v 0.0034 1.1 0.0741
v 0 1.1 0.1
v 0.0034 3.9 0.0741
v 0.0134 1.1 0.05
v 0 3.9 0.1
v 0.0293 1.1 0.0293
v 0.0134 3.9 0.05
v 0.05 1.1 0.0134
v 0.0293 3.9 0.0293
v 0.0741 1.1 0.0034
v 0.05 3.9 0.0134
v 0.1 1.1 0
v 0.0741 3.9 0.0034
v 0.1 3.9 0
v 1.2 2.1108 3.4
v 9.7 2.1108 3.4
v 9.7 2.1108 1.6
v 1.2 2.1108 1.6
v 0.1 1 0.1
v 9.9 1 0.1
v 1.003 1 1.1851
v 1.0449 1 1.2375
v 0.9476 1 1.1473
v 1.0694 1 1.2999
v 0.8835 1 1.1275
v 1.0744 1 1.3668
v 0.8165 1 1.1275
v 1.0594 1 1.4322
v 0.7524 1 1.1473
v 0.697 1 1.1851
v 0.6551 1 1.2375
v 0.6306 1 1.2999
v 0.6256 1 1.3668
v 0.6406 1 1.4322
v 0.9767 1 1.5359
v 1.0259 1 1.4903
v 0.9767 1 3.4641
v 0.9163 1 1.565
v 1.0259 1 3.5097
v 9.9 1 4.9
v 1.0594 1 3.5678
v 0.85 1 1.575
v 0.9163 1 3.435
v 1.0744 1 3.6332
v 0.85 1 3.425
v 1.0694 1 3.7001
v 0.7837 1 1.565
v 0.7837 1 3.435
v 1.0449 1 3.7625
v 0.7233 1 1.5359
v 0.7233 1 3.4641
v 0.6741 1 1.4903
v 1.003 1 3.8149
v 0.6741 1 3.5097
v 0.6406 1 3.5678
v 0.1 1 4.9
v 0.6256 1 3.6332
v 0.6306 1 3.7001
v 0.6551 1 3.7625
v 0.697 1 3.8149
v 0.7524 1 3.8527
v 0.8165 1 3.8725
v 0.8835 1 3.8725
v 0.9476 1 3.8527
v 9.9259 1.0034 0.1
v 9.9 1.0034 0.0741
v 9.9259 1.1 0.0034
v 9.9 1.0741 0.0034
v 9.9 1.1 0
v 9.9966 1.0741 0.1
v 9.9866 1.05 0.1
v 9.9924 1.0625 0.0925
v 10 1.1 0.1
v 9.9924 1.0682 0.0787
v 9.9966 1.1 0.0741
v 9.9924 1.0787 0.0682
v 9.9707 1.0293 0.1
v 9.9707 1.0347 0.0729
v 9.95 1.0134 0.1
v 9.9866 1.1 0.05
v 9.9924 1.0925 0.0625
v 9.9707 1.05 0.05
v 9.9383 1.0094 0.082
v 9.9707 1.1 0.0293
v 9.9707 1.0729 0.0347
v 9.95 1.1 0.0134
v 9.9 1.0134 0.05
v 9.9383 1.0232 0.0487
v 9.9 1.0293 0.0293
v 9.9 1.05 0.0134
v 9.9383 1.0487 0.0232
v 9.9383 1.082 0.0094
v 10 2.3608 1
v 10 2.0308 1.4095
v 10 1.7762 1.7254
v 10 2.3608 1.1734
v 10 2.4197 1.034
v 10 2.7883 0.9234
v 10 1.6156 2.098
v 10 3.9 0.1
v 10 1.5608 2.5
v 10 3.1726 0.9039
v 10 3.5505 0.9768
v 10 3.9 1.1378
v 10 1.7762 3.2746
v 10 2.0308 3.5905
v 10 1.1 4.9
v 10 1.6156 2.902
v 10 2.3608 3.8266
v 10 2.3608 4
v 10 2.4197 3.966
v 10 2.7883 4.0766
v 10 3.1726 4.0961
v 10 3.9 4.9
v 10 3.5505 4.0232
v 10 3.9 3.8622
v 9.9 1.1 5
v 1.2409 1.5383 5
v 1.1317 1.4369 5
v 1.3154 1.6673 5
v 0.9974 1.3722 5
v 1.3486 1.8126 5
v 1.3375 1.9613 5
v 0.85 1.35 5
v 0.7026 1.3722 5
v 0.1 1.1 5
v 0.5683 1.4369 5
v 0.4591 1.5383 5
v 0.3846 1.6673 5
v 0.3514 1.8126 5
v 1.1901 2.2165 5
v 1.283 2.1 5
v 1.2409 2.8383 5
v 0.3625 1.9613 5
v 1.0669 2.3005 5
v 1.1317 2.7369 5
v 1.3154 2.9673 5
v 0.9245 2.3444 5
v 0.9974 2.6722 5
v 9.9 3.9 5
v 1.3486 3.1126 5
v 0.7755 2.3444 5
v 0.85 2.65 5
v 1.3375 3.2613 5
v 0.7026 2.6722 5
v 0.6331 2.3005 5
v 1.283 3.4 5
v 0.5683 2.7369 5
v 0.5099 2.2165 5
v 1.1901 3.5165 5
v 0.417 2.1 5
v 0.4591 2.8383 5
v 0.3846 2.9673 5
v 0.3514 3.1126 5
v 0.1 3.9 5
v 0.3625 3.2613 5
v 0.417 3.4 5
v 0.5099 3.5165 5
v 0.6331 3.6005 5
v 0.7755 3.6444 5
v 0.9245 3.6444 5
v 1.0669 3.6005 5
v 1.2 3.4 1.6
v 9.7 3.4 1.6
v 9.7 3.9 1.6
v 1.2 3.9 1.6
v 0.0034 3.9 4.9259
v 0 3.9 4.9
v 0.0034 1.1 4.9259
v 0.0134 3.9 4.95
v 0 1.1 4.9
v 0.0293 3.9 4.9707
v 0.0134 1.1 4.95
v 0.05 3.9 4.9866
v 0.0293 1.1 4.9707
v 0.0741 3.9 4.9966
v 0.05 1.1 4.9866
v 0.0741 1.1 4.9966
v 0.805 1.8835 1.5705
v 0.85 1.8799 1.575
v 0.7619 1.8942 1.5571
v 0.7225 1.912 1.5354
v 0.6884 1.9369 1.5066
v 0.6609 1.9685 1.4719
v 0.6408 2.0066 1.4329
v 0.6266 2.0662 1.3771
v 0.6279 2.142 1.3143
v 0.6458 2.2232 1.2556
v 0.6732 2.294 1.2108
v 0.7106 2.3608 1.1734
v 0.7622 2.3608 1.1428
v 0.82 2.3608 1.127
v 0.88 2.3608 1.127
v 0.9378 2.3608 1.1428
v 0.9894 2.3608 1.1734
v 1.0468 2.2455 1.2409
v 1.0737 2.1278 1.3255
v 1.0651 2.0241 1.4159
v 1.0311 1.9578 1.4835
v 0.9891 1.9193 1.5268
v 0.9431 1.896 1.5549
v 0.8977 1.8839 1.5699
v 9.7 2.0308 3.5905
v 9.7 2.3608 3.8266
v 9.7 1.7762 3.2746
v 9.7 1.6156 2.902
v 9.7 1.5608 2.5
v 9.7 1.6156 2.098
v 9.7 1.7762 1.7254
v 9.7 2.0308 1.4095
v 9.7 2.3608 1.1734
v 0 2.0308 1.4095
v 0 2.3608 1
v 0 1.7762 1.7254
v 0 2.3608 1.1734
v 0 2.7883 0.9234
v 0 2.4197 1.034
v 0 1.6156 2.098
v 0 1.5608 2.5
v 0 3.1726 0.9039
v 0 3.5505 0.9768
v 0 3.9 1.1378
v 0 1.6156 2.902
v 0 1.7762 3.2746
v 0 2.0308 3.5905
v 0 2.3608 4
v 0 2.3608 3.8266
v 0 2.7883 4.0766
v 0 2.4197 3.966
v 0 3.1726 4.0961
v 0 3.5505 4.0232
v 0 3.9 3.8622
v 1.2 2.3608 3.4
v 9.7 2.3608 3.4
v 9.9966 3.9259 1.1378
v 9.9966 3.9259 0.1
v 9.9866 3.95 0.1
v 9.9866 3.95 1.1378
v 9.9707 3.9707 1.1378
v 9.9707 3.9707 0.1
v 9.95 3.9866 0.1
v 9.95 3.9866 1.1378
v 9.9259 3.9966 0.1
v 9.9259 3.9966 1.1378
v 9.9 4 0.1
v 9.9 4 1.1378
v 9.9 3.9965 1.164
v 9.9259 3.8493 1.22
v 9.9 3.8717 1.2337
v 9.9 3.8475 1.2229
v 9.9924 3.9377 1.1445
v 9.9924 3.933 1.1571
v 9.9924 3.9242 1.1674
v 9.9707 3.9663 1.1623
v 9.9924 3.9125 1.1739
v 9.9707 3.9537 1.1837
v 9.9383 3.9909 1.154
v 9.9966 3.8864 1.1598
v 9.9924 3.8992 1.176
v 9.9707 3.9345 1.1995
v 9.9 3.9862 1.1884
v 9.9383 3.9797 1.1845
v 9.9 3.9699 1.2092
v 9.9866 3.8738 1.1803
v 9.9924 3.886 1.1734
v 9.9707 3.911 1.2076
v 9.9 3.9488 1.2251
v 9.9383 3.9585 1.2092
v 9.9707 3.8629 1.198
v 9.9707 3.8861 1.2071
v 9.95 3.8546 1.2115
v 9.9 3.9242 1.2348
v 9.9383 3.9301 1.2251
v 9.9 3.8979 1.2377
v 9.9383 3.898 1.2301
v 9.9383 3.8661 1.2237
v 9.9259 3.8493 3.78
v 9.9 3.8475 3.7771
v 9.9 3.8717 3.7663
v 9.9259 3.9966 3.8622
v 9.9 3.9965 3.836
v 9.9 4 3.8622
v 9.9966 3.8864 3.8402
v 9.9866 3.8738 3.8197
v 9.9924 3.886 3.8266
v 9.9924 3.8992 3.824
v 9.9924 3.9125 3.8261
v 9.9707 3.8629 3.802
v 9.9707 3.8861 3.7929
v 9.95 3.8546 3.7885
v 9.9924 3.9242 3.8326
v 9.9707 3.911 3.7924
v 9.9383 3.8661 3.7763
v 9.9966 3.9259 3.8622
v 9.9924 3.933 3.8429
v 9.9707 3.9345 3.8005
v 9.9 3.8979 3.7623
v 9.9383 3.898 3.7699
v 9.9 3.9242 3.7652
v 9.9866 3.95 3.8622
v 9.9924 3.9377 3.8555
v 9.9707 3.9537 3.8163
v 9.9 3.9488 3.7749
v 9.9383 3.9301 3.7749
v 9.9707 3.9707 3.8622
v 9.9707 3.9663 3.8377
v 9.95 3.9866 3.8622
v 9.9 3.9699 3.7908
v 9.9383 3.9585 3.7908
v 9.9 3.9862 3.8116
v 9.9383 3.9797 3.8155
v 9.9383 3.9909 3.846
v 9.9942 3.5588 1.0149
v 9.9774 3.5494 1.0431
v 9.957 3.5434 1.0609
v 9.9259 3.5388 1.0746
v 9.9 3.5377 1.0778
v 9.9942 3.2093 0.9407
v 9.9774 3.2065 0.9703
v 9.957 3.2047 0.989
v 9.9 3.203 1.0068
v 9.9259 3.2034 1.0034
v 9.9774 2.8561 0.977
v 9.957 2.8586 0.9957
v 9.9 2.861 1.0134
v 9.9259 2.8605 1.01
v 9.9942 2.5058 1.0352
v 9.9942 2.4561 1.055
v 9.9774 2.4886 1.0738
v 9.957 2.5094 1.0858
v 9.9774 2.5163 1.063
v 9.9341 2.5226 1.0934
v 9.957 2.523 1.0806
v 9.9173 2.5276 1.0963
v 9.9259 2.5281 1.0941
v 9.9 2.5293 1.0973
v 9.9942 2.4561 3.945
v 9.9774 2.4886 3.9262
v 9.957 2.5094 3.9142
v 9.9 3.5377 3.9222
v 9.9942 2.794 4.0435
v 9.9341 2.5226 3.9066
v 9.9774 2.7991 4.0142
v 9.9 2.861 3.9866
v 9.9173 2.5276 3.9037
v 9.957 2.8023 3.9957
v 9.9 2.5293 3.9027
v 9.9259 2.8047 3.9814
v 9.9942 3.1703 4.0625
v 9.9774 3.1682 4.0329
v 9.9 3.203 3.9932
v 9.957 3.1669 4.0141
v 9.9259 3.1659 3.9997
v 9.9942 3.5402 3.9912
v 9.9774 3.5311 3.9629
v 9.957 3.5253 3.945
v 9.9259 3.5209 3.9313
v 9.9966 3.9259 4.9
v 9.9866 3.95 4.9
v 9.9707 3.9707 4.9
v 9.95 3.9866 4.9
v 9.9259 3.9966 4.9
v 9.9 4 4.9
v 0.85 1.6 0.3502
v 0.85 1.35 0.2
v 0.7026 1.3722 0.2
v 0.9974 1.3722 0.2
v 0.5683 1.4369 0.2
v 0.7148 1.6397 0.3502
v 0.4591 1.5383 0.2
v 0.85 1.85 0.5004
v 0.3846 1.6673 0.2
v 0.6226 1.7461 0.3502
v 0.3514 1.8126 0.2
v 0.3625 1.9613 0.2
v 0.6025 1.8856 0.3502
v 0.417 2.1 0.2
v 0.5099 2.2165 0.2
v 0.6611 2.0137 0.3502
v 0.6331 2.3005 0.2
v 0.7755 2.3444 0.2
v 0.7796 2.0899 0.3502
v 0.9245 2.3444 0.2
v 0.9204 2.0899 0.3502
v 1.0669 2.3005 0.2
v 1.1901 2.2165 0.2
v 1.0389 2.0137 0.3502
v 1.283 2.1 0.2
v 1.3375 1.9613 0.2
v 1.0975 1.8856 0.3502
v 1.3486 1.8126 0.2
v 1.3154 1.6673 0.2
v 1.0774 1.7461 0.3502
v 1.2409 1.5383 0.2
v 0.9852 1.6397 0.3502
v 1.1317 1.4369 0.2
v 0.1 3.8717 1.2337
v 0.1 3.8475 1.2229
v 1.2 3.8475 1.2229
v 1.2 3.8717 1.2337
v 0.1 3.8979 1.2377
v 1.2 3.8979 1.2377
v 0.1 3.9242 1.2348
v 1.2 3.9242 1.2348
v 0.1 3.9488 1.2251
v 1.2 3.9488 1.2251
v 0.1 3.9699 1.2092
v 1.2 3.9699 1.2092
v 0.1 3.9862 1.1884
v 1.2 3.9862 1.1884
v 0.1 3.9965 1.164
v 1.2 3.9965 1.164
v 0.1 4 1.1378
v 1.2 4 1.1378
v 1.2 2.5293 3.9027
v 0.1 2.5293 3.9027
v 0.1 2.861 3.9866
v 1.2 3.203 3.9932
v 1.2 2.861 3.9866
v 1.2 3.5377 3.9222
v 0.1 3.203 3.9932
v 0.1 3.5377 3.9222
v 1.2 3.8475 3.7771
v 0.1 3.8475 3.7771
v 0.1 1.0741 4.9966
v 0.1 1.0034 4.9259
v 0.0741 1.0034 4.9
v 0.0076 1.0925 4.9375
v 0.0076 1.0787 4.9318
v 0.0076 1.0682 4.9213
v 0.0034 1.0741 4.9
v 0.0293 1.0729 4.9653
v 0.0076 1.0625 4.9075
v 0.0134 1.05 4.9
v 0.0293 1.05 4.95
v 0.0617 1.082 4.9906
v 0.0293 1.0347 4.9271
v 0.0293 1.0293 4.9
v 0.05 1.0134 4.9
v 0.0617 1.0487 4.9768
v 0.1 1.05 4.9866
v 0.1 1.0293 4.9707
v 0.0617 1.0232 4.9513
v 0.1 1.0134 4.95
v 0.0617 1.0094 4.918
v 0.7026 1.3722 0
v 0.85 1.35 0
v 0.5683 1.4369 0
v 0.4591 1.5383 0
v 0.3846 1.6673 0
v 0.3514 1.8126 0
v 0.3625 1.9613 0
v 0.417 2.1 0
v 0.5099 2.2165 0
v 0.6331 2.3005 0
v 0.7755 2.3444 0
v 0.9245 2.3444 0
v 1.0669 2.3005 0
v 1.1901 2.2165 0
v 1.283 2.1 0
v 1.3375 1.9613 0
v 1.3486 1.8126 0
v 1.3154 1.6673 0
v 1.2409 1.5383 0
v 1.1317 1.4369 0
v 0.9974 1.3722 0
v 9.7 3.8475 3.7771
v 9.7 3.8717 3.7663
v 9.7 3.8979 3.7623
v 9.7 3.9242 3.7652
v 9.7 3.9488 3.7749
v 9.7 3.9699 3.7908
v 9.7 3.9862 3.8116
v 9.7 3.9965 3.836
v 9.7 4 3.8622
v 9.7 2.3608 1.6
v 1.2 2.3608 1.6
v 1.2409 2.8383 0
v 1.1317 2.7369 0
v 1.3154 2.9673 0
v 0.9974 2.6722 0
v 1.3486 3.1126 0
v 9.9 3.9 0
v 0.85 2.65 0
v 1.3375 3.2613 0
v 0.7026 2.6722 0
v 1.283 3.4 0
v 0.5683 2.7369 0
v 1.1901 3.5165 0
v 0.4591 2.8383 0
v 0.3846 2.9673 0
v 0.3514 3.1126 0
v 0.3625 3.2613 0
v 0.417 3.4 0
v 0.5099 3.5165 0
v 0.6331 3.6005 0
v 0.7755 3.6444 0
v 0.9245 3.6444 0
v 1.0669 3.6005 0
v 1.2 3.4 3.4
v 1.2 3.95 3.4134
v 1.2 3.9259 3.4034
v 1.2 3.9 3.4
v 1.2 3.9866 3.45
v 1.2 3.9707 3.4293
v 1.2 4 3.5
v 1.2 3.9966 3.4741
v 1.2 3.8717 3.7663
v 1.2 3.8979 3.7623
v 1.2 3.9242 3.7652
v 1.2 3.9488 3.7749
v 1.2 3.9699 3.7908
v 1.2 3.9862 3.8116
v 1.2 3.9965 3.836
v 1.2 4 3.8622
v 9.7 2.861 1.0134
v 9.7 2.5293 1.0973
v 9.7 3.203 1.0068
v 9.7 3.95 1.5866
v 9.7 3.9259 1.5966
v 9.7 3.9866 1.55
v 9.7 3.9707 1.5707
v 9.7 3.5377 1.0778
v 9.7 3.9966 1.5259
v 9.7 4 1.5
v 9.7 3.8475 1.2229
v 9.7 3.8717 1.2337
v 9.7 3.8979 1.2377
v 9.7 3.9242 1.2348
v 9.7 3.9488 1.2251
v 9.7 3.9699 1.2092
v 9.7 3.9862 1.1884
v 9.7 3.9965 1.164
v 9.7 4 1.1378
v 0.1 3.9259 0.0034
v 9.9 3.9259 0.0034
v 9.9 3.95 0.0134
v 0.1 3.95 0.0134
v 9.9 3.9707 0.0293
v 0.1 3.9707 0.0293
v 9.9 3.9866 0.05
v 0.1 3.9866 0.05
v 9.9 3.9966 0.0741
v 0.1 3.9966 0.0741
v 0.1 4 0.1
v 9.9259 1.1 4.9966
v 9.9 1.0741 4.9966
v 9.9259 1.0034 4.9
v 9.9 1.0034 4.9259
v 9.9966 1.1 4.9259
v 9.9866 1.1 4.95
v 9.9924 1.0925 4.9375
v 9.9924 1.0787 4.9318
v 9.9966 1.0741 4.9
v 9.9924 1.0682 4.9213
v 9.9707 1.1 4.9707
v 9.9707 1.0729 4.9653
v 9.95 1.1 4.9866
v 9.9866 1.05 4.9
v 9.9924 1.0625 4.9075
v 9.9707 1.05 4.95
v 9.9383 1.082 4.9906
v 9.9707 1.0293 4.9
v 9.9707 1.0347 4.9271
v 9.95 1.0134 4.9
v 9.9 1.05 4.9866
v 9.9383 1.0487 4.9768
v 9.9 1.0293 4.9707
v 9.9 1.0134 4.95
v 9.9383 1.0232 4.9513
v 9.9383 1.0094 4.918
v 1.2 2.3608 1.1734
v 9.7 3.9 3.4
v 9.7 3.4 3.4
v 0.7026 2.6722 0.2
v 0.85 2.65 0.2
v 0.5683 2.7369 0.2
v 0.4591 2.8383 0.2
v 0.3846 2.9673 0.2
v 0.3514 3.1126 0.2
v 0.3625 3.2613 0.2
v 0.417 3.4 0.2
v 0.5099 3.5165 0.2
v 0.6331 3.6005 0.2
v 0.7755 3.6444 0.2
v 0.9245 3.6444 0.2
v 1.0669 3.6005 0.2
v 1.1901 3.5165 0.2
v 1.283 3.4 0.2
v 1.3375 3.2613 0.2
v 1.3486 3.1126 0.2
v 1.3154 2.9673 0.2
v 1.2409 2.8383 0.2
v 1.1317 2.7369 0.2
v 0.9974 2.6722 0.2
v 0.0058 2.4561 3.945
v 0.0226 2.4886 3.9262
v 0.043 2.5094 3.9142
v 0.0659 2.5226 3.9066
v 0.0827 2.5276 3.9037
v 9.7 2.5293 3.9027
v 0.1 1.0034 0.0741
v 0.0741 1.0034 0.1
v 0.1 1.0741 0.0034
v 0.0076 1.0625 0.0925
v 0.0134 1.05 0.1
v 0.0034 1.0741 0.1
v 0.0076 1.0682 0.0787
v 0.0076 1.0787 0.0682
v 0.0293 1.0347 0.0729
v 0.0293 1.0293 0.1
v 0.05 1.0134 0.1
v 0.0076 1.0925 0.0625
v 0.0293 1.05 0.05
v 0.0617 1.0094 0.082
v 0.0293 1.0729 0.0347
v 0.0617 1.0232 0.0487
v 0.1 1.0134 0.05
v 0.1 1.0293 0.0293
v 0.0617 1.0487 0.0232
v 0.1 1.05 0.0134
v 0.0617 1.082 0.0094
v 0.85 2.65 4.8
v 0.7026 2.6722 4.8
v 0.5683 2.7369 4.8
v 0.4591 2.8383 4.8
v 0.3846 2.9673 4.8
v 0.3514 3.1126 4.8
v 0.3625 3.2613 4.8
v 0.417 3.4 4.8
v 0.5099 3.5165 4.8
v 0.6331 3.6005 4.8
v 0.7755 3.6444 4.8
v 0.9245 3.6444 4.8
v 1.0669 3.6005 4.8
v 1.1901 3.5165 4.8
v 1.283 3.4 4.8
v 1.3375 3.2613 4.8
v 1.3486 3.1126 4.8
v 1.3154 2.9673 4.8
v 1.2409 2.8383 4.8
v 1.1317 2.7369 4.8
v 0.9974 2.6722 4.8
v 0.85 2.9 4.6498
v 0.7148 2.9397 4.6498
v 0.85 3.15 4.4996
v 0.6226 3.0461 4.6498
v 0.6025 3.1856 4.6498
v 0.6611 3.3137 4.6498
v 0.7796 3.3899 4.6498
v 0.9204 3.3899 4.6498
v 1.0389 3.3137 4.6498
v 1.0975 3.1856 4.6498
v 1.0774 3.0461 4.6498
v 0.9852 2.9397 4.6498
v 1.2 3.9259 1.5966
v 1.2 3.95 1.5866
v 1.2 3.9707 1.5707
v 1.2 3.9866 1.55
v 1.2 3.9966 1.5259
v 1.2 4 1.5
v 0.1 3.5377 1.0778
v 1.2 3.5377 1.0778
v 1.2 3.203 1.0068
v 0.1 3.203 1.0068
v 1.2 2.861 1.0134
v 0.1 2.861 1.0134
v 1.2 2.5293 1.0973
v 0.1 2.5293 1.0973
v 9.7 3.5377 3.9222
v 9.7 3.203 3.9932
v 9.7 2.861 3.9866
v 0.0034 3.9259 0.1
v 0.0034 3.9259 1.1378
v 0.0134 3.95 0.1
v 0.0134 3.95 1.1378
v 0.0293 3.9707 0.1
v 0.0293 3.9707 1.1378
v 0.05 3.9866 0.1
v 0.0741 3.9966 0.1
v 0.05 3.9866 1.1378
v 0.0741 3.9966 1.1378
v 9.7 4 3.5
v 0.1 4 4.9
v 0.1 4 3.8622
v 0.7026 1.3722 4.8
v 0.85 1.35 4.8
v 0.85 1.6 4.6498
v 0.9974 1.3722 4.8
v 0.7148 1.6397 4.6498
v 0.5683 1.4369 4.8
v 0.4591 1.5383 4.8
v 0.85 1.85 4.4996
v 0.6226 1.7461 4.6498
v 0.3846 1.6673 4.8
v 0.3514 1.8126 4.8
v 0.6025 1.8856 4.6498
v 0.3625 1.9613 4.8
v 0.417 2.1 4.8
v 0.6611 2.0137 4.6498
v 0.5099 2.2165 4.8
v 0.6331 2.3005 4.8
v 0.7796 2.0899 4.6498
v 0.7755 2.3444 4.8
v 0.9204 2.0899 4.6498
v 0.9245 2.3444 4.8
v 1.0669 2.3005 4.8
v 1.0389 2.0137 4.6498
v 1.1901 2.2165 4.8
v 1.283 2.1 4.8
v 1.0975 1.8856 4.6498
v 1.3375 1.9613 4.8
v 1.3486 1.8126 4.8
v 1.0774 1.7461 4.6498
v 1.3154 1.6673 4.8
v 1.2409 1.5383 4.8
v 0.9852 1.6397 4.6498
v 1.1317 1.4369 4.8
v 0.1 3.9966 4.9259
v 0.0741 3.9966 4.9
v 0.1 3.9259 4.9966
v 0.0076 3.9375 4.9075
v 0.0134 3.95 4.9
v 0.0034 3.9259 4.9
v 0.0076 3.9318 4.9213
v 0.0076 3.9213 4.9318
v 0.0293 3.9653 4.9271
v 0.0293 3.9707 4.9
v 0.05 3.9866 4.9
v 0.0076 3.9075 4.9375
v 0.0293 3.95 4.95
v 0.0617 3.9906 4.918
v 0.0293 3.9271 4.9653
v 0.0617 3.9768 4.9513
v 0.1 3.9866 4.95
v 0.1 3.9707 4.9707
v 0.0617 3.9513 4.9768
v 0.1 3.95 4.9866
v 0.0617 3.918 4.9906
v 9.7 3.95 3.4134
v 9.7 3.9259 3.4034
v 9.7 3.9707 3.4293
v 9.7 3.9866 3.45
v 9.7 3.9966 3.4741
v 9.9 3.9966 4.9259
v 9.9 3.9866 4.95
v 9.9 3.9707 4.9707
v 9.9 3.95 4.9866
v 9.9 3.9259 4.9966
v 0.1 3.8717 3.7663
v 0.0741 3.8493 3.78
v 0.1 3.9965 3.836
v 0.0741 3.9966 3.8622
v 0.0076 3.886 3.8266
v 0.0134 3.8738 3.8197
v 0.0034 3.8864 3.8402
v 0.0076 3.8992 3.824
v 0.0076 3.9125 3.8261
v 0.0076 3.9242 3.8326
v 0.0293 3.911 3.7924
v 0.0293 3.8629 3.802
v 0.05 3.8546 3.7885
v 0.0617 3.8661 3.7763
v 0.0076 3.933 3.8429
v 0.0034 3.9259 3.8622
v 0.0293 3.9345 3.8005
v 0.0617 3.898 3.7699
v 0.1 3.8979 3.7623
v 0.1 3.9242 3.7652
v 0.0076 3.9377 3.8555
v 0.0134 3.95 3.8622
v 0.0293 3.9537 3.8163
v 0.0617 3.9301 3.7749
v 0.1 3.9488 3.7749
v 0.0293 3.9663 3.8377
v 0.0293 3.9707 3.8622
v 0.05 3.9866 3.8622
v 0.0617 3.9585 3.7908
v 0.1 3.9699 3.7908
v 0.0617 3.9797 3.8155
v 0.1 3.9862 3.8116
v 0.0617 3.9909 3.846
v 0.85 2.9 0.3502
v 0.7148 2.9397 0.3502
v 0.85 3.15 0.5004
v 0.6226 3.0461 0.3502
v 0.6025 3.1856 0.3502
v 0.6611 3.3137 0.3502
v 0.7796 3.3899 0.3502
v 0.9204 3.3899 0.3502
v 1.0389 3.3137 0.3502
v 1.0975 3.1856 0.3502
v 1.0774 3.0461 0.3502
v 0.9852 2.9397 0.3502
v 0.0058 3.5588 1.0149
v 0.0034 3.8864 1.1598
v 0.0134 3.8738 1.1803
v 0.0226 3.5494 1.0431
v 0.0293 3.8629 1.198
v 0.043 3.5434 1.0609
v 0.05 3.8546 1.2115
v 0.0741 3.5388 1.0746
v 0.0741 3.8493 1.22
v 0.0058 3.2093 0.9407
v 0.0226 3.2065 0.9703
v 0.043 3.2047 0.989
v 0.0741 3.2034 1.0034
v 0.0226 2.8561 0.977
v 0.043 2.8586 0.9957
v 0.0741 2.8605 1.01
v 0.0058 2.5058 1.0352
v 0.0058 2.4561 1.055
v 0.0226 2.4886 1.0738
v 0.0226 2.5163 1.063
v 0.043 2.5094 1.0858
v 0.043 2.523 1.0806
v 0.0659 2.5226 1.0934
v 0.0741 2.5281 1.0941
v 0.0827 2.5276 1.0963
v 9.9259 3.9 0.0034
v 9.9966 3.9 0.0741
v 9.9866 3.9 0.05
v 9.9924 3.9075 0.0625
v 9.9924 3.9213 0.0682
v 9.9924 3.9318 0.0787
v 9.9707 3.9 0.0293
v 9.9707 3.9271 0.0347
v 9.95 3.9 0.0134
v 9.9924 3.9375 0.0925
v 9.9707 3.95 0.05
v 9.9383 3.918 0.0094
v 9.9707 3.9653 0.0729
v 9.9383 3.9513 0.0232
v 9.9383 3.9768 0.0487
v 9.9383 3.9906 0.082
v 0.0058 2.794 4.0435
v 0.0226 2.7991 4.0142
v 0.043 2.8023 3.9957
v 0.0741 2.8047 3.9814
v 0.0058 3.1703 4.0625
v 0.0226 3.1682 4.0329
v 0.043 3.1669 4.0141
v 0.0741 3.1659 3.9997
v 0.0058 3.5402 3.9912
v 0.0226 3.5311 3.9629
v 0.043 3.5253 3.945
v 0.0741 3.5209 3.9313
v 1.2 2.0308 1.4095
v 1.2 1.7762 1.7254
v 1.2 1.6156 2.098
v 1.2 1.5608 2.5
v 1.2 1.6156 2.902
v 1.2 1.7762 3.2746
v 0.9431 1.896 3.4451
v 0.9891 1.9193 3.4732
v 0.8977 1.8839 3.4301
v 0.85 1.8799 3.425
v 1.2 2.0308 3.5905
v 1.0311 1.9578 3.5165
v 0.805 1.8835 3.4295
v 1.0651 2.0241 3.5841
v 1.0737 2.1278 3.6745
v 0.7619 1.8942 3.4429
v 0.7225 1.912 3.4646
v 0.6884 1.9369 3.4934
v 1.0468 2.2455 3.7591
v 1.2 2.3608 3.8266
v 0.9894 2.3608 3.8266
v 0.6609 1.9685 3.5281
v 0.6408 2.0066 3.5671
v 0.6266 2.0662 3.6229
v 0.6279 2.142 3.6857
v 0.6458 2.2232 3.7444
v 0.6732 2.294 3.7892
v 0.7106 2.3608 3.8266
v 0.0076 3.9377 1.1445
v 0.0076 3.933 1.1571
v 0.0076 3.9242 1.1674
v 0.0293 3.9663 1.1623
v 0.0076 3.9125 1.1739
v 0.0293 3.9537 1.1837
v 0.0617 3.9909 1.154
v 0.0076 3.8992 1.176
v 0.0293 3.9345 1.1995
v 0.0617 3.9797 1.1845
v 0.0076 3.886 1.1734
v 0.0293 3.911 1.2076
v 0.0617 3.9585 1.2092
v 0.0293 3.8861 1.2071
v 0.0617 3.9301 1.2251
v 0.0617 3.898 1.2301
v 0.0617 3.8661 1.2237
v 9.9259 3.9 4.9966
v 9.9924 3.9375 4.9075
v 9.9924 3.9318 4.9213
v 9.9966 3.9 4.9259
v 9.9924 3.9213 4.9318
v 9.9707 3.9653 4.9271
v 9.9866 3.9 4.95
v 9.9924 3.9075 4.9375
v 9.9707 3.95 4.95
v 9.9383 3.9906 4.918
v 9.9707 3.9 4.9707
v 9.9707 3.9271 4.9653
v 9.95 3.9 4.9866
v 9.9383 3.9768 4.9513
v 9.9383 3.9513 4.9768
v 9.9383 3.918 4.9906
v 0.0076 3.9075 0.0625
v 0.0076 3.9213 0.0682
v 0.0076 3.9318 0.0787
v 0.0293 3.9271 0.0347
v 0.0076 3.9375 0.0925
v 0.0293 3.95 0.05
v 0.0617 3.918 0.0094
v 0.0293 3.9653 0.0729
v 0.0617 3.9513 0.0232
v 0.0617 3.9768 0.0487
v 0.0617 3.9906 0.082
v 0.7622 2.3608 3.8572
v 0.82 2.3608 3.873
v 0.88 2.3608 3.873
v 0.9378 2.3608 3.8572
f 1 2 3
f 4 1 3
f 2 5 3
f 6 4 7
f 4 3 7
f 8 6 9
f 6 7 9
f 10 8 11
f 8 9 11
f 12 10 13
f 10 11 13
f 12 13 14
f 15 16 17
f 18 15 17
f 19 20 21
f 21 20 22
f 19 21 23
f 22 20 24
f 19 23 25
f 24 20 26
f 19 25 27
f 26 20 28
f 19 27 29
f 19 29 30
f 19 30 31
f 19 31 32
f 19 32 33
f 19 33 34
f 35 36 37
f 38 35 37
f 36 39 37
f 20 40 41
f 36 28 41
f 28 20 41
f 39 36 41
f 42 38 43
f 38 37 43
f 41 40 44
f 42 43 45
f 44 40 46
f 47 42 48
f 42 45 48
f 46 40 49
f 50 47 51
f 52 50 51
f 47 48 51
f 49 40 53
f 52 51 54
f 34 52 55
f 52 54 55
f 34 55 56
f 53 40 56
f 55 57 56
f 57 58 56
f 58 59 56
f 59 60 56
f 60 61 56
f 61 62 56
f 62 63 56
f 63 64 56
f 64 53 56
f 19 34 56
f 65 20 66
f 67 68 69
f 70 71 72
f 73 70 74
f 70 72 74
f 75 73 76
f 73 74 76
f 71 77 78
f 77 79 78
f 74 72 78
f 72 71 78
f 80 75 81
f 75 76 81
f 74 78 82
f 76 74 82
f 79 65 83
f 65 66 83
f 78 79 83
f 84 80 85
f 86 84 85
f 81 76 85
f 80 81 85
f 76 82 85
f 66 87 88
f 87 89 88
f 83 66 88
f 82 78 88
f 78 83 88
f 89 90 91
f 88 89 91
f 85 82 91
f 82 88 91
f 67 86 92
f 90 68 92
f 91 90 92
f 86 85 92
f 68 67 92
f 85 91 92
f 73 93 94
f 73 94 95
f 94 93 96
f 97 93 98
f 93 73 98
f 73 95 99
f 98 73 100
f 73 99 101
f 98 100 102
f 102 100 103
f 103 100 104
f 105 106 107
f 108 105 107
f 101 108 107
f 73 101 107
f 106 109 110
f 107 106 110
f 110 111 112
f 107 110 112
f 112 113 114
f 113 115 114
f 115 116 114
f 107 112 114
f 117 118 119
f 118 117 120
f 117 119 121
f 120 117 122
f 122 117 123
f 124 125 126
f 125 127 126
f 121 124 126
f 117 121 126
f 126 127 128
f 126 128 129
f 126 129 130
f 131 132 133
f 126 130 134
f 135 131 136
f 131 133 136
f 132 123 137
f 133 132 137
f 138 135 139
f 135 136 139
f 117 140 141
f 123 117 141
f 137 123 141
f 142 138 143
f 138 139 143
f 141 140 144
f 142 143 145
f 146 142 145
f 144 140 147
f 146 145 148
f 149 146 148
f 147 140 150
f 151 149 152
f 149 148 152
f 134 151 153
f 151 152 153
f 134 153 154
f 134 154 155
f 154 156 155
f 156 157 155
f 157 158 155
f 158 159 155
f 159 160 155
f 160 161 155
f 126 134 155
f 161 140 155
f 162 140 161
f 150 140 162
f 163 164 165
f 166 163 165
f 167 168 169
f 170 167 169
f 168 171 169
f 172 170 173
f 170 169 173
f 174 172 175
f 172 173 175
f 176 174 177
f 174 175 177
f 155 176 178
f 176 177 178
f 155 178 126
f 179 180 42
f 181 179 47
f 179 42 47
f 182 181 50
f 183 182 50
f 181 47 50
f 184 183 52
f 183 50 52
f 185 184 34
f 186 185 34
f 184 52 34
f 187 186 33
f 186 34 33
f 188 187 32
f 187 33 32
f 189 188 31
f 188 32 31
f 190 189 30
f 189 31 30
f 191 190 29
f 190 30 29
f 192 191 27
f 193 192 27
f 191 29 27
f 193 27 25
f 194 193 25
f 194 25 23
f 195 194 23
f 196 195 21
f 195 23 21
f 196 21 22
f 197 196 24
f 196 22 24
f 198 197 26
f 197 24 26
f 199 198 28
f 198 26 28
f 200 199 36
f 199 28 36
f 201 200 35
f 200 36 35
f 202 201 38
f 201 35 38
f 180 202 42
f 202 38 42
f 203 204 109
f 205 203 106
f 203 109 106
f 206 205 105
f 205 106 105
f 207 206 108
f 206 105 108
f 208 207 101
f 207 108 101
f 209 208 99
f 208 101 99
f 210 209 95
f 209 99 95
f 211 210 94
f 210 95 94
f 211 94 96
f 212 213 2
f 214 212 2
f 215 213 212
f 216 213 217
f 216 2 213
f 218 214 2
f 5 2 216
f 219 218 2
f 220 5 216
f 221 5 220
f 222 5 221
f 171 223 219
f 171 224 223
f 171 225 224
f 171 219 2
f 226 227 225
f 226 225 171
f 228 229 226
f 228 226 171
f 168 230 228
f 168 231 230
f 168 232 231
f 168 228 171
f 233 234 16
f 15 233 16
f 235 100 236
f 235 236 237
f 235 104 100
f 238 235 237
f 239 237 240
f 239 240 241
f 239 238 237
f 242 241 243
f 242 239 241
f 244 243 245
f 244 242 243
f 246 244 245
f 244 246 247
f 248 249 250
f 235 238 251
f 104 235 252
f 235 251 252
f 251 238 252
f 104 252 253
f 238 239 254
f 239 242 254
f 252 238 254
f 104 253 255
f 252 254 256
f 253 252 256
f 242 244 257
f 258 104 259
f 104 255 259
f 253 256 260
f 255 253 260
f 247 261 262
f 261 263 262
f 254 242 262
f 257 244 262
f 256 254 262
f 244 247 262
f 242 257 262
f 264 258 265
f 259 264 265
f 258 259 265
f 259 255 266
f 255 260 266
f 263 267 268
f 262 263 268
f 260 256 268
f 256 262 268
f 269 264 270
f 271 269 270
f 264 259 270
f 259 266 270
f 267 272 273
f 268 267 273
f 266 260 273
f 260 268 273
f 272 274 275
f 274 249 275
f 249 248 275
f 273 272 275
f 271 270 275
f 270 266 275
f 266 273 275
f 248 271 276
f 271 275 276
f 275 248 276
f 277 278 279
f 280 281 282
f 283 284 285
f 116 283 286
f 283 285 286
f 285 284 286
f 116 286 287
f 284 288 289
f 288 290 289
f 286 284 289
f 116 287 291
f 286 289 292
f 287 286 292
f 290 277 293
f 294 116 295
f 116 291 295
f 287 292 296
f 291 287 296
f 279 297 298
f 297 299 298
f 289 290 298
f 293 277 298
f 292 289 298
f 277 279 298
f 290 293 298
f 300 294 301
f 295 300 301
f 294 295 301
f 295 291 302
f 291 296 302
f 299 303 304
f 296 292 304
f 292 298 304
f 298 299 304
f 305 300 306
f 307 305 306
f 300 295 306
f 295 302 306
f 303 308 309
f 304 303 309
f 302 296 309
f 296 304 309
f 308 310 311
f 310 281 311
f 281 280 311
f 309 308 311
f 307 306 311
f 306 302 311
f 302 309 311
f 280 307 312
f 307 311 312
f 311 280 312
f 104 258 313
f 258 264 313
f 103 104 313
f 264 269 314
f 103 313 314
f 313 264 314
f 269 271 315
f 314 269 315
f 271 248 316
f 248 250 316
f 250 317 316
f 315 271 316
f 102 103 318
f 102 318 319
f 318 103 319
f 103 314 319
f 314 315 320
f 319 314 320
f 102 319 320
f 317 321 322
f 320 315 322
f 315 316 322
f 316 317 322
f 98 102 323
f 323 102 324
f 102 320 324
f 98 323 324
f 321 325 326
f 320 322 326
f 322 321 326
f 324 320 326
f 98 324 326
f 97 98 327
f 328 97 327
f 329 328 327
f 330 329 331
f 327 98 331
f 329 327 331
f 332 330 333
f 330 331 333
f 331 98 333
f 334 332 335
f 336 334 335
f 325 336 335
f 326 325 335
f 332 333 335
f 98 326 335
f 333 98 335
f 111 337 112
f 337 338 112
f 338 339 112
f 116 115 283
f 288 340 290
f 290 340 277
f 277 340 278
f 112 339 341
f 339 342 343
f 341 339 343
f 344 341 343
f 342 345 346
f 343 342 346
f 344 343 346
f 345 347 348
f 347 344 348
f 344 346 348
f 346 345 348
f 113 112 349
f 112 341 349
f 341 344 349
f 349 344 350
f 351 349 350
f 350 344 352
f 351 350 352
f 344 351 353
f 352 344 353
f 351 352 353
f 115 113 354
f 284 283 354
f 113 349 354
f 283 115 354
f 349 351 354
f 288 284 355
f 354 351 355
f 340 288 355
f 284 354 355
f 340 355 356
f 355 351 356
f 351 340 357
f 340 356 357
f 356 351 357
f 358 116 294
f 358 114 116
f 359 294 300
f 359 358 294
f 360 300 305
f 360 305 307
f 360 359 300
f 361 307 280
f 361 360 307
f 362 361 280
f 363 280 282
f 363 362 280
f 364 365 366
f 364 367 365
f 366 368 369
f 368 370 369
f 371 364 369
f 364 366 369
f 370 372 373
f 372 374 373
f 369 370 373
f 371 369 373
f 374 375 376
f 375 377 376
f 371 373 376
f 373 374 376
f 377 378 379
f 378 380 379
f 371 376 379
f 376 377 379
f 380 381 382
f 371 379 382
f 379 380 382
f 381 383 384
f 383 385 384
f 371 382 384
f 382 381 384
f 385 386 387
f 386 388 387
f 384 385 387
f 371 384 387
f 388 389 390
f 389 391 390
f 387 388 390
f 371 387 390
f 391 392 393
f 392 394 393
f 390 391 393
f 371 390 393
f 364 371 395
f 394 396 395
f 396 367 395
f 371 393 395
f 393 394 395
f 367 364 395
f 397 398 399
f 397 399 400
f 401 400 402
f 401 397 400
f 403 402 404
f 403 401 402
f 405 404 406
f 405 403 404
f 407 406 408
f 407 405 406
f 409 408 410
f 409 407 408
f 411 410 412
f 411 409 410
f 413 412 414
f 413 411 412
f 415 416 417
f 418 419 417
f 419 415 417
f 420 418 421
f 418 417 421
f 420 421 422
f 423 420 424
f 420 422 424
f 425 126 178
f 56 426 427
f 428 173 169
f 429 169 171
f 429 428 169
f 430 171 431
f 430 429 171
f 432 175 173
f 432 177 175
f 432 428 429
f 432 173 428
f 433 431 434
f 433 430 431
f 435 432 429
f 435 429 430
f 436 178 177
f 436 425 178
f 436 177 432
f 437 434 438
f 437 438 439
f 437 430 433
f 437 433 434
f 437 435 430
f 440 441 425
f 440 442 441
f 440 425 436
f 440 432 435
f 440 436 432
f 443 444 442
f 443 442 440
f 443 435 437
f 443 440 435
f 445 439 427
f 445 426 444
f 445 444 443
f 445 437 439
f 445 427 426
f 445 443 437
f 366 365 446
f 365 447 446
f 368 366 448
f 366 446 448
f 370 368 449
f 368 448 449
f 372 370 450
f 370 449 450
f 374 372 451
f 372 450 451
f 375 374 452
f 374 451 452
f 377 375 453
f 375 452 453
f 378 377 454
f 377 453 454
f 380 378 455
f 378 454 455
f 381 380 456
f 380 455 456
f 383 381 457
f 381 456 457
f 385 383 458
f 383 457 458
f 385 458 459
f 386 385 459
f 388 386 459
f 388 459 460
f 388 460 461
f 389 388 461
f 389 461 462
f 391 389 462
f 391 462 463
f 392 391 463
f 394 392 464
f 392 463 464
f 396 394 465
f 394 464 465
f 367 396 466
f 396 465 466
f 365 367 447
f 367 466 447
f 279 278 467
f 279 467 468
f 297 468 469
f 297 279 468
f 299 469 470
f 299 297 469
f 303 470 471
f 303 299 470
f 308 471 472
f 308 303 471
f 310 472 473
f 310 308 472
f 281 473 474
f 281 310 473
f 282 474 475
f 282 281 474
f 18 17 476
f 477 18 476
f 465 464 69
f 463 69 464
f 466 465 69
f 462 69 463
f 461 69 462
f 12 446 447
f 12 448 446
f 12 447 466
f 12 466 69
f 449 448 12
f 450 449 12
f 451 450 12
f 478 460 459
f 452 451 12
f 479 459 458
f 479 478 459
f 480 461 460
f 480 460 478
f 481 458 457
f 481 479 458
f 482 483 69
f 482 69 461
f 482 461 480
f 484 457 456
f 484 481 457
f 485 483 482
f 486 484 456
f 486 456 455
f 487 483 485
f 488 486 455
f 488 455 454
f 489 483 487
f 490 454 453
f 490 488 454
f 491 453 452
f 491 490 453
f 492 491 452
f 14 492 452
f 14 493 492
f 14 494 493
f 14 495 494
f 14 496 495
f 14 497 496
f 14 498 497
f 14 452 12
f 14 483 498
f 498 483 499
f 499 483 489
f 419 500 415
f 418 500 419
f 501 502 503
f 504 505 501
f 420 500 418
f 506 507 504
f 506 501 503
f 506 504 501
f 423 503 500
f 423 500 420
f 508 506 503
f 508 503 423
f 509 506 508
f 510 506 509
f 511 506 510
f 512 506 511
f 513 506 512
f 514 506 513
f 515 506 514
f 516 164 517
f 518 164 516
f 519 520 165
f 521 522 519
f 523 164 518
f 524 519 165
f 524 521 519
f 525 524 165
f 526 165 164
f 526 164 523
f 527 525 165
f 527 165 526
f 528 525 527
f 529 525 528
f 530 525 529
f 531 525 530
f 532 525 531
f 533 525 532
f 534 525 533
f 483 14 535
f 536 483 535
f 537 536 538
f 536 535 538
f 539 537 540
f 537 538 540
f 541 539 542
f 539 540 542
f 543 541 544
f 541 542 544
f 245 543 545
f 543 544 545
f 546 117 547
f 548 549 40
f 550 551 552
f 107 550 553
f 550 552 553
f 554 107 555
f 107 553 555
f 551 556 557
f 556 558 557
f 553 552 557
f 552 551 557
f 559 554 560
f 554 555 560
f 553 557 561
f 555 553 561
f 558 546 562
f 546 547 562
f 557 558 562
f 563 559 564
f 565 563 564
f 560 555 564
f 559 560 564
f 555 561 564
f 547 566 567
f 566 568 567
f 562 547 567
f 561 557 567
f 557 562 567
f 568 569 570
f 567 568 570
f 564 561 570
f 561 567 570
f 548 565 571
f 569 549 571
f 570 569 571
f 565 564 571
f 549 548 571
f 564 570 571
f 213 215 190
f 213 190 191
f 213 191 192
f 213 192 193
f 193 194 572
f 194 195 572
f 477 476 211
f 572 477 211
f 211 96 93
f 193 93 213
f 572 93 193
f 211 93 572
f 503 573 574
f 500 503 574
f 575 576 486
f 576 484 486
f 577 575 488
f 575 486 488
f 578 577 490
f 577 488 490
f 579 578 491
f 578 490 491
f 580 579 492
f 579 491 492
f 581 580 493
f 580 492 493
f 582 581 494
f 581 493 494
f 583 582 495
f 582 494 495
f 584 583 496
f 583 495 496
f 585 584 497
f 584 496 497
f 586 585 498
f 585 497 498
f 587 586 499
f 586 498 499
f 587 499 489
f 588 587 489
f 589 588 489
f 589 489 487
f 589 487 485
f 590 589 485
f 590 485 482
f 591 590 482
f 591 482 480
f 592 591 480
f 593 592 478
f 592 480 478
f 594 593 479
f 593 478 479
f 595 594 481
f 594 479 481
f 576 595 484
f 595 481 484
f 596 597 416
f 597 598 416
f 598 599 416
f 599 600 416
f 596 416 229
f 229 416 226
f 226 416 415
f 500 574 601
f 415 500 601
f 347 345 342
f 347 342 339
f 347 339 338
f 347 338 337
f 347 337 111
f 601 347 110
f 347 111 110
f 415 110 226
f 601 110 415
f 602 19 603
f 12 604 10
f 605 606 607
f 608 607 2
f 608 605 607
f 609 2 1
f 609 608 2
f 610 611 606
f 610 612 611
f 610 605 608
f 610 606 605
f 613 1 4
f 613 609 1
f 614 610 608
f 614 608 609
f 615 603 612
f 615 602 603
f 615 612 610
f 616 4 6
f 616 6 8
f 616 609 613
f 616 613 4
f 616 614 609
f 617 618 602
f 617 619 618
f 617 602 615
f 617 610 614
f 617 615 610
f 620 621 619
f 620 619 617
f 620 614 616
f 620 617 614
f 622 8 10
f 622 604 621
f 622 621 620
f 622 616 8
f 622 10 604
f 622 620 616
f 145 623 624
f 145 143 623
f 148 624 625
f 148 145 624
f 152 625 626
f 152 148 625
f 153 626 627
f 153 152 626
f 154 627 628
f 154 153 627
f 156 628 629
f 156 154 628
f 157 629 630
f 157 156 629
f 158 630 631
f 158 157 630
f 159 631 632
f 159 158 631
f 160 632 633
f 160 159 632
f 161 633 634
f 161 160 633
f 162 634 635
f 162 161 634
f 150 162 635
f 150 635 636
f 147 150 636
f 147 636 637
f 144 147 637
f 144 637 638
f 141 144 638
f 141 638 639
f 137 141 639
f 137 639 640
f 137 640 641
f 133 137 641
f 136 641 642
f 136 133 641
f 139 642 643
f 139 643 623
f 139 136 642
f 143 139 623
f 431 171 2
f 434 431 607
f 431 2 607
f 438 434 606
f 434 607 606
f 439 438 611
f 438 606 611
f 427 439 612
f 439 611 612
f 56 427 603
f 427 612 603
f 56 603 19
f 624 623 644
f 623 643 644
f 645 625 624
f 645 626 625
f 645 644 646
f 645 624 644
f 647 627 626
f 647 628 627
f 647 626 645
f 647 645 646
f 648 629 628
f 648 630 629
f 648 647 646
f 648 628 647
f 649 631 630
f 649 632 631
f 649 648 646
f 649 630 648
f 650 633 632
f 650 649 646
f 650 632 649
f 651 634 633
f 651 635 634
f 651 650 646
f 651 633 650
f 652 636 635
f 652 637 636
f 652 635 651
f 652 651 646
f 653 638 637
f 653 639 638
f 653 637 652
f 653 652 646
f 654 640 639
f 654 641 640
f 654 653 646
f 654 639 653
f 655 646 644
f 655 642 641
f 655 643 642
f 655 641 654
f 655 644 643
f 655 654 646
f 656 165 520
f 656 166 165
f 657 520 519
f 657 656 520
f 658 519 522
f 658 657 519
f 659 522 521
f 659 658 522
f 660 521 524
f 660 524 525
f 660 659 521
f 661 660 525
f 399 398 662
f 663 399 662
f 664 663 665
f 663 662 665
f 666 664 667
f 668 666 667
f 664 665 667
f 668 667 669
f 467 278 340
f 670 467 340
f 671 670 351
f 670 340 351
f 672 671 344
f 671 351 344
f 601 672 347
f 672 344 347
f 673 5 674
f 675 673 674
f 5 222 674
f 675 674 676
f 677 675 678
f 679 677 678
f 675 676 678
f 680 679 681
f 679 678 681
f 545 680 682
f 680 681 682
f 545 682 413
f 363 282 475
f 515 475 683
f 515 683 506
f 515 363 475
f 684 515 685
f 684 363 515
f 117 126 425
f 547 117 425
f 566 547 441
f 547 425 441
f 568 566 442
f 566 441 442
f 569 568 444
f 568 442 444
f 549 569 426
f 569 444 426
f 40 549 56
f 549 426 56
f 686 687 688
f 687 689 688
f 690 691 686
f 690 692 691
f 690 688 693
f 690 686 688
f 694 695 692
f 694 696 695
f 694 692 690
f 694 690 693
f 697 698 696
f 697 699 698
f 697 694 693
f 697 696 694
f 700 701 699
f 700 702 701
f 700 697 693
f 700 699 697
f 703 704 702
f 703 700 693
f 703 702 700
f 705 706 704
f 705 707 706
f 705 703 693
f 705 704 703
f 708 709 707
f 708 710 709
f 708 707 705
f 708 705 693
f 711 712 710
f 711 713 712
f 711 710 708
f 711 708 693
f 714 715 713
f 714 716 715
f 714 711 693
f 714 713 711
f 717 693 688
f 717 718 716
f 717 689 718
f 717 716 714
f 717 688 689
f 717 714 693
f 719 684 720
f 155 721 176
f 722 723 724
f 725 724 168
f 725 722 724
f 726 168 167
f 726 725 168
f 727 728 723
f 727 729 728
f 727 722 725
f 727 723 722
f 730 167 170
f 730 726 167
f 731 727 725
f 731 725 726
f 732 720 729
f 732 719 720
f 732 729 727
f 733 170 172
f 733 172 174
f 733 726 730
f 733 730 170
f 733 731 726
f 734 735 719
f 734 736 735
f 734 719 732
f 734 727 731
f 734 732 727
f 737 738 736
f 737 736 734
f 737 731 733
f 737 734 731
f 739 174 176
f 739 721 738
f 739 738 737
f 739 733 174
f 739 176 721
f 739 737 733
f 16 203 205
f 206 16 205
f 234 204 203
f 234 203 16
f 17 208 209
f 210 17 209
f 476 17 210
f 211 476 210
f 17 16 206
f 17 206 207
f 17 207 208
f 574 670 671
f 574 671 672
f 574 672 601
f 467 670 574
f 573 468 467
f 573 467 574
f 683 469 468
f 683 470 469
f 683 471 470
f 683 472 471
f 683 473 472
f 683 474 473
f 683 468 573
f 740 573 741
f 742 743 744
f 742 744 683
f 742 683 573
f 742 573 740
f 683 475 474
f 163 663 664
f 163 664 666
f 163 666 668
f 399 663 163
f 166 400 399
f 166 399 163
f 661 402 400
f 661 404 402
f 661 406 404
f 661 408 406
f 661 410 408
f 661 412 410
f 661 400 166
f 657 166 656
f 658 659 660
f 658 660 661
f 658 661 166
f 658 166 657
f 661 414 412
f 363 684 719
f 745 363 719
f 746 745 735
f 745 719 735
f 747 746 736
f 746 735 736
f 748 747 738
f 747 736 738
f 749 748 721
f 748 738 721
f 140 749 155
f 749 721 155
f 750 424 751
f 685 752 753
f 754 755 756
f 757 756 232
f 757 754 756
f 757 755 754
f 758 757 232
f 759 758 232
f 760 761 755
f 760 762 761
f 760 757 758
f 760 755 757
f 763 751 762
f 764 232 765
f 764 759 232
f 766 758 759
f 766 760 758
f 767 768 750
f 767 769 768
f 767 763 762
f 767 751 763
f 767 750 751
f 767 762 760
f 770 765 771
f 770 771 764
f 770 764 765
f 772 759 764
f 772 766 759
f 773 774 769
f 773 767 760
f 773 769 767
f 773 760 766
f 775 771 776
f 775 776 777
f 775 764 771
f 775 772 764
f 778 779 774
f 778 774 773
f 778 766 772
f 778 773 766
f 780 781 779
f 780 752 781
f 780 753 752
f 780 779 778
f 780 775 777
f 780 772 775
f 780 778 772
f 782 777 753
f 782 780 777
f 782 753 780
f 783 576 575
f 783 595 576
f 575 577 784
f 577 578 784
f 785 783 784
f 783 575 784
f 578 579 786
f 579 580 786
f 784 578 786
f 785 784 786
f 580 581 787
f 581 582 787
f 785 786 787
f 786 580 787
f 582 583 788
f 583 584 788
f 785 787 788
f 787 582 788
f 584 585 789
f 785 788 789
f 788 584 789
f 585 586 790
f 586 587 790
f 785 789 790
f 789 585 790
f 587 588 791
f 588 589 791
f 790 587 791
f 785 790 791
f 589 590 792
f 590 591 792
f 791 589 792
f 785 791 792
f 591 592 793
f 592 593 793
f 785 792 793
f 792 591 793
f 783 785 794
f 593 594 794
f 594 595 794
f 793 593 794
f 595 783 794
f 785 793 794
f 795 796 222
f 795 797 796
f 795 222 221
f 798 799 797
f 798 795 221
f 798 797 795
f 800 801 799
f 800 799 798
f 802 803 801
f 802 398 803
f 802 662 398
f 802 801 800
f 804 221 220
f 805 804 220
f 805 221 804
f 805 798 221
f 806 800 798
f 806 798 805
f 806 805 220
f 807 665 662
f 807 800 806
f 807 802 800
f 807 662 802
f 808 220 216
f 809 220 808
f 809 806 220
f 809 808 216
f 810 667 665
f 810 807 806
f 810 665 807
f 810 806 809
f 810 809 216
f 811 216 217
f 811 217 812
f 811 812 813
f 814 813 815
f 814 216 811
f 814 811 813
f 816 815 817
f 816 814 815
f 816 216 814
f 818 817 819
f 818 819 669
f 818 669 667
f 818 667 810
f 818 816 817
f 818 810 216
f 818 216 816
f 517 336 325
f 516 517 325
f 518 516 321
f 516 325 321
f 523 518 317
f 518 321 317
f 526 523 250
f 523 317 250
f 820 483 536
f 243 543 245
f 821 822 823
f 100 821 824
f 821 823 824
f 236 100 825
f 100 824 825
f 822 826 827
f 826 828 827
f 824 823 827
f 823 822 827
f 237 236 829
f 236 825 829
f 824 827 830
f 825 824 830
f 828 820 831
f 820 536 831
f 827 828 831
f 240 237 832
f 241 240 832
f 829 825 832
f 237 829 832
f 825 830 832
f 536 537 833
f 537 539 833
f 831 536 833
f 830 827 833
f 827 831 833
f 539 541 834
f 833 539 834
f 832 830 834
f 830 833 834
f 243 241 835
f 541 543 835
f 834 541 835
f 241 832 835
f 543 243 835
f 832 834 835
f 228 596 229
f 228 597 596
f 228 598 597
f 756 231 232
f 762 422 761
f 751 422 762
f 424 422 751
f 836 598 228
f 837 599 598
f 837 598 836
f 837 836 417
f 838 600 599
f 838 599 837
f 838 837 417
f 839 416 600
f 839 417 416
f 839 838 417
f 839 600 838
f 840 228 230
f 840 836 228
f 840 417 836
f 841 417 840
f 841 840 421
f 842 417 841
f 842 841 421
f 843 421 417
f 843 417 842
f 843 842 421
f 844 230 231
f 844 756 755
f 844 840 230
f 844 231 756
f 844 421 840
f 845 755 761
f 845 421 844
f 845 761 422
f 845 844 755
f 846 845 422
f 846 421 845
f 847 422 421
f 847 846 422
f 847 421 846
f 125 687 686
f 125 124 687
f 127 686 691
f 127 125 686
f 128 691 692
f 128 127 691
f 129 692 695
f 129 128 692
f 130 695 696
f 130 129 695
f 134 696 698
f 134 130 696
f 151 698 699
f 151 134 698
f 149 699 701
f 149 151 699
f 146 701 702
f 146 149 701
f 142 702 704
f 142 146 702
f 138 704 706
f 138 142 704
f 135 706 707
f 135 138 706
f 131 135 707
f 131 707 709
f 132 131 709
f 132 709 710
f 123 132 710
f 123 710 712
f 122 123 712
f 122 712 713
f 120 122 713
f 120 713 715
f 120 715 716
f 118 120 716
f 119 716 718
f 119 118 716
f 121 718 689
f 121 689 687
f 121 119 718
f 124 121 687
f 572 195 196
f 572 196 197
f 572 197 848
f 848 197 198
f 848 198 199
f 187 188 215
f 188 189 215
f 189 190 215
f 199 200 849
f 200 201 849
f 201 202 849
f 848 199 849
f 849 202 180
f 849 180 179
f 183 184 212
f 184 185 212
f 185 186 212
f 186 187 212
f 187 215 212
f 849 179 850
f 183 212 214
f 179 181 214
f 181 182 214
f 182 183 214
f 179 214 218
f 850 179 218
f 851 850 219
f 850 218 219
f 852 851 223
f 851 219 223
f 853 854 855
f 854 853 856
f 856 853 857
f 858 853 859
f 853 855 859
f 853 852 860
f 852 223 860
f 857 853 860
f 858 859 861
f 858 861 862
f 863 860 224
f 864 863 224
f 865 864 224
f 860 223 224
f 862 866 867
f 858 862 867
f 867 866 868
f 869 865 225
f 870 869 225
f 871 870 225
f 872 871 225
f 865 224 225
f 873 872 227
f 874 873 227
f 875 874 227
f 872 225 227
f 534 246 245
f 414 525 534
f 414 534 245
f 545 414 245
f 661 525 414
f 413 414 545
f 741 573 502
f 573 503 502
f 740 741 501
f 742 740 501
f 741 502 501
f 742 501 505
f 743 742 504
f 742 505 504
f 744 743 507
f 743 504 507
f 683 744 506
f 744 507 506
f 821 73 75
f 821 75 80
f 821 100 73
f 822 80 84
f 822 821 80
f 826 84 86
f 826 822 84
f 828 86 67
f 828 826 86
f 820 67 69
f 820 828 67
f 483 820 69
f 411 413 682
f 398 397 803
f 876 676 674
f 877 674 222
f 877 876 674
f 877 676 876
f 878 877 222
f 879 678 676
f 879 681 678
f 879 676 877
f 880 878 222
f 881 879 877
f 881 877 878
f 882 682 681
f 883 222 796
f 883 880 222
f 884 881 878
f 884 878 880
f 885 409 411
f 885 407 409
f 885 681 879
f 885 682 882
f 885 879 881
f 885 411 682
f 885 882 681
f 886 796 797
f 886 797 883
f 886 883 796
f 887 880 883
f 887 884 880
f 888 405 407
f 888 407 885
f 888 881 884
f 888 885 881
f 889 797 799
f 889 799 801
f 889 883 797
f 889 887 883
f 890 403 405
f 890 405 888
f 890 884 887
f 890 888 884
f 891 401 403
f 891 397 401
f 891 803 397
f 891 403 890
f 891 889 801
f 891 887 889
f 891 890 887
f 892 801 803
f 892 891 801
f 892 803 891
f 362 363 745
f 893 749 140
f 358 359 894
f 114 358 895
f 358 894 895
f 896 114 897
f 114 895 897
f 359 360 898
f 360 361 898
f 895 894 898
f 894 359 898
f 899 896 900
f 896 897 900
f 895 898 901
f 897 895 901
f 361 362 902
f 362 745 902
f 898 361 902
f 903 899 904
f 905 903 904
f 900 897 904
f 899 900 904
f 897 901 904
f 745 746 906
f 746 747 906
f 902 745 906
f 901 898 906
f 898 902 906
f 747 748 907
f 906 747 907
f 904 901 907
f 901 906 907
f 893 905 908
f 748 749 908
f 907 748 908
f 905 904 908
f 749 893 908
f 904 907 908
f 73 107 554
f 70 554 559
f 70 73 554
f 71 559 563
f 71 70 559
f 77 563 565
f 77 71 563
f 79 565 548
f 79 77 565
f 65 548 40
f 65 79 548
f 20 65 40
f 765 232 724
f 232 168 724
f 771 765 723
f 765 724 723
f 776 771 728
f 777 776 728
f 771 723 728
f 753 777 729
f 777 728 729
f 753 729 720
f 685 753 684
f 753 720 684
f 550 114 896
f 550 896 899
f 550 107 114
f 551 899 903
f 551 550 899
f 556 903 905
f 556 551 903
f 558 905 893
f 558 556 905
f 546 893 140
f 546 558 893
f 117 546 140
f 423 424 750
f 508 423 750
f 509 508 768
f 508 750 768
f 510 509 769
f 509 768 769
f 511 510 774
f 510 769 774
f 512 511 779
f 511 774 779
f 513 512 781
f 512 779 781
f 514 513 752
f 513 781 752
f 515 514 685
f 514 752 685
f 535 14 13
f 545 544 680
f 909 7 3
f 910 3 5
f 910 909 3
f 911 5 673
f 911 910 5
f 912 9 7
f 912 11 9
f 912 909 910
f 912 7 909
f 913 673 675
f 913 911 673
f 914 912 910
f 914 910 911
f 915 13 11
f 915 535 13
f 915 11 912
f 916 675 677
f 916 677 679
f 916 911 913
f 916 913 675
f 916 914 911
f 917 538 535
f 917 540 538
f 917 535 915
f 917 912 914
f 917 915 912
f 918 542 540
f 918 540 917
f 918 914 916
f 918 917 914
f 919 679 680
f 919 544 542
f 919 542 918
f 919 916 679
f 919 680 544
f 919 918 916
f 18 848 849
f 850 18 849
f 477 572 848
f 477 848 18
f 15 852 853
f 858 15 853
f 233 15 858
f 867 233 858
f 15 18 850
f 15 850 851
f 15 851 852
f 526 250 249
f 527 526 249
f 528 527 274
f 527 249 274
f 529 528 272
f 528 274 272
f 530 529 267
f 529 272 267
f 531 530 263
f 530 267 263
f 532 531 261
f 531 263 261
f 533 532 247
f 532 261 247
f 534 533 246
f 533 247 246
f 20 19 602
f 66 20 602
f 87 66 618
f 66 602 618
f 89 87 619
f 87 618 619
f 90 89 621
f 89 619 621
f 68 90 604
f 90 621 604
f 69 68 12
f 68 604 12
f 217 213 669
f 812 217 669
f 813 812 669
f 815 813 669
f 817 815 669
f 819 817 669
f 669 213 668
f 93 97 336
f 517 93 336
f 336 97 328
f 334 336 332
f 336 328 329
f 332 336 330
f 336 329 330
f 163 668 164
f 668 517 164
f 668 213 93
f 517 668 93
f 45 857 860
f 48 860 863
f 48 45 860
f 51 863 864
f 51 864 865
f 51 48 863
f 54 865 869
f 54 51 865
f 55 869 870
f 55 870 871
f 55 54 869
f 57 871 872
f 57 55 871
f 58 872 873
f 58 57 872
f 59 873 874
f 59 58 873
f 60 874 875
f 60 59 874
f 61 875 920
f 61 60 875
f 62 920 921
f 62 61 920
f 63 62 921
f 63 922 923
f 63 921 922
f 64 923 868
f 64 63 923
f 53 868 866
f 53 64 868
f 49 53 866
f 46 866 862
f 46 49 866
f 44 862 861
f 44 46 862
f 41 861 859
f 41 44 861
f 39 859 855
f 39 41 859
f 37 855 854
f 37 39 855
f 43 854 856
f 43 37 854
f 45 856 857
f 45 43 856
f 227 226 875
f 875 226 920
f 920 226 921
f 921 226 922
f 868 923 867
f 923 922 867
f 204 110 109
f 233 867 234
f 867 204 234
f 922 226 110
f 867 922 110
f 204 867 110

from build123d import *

# Parameters (mm, degrees)
SKETCH1_W                      = 10
SKETCH1_H                      = 5
BOSS_EXTRUDE1_DEPTH            = 3
CUT_EXTRUDE9_DEPTH             = 11
SKETCH20_R                     = 1.5
CUT_EXTRUDE11_DEPTH            = 1.2
SKETCH22_R                     = 1.5
SKETCH22_R_2                   = 0.55
CUT_EXTRUDE12_DEPTH            = 0.3
FILLET1_R                      = 0.1
FILLET2_R                      = 0.1
F_1_0MM_DOWEL_HOLE1_AT_2_COUNT = 2
F_1_0MM_DOWEL_HOLE1_AT_2_PITCH = 1.3


with BuildPart() as part:
    # Sketch1 → Boss-Extrude1 (new body)
    with BuildSketch(Plane(origin=(0, 4, 0), x_dir=(-1, 0, 0), z_dir=(0, 1, 0))):
        with Locations((-5, 2.5)):
            Rectangle(SKETCH1_W, SKETCH1_H)
    extrude(amount=-BOSS_EXTRUDE1_DEPTH)

    # Sketch18 → Cut-Extrude9 (cut, through all)
    with BuildSketch(Plane(origin=(10, 0, 0), x_dir=(0, 0, -1), z_dir=(1, 0, 0))):
        Polygon((-3.4, 3.4), (-4, 2.360769515), (-3.4, 2.360769515), (-3.4, 2.110769515), (-1.6, 2.110769515), (-1.6, 2.360769515), (-1, 2.360769515), (-1.6, 3.4), (-1.6, 4), (-3.4, 4), align=None)
    extrude(amount=-CUT_EXTRUDE9_DEPTH, mode=Mode.SUBTRACT)

    # Sketch20 → Cut-Extrude11 (cut)
    with BuildSketch(Plane.ZY):
        with Locations((2.5, 3.060769515)):
            Circle(SKETCH20_R)
    extrude(amount=-CUT_EXTRUDE11_DEPTH, mode=Mode.SUBTRACT)

    # Sketch22 → Cut-Extrude12 (cut)
    with BuildSketch(Plane(origin=(10, 0, 0), x_dir=(0, 0, -1), z_dir=(1, 0, 0))):
        with Locations((-2.5, 3.060769515)):
            Circle(SKETCH22_R)
        with Locations((-2.5, 3.060769515)):
            Circle(SKETCH22_R_2, mode=Mode.SUBTRACT)
    extrude(amount=-CUT_EXTRUDE12_DEPTH, mode=Mode.SUBTRACT)

    # Fillet1
    fillet1_edges = [part.edges().sort_by_distance(p)[0] for p in [
        (5, 1, 5),
        (5, 1, 0),
        (5, 4, 5),
        (5.45, 4, 1.6),
        (5.45, 4, 3.4),
        (5, 4, 0),
        (0.6, 4, 3.669549527),
        (0.6, 4, 1.330450473),
        (9.85, 4, 3.669549527),
        (9.85, 4, 1.330450473),
    ]]
    fillet(fillet1_edges, radius=FILLET1_R)

    # Fillet2
    fillet2_edges = [part.edges().sort_by_distance(p)[0] for p in [
        (10, 3.203038233, 1.006762038),
        (10, 3.203038233, 3.993237962),
        (10, 4, 4.381118968),
        (10, 2.5, 5),
        (10, 1, 2.5),
        (10, 2.5, 0),
        (10, 4, 0.618881032),
        (10, 3.970710678, 4.970710678),
        (10, 3.970710678, 0.029289322),
        (10, 1.029289322, 0.029289322),
        (10, 1.029289322, 4.970710678),
        (10, 3.948758638, 1.22506954),
        (10, 3.948758638, 3.77493046),
        (0, 4, 4.381118968),
        (0, 4, 0.618881032),
        (0, 3.203038233, 1.006762038),
        (0, 2.5, 0),
        (0, 1, 2.5),
        (0, 2.5, 5),
        (0, 3.970710678, 4.970710678),
        (0, 3.970710678, 0.029289322),
        (0, 1.029289322, 0.029289322),
        (0, 1.029289322, 4.970710678),
        (0, 3.948758638, 1.22506954),
        (0, 3.948758638, 3.77493046),
        (0, 3.203038233, 3.993237962),
    ]]
    fillet(fillet2_edges, radius=FILLET2_R)

    # Sketch26 → Ø1.0mm Dowel Hole1 (revolve, cut)
    with BuildSketch(Plane(origin=(0.85, 3.15, 5), x_dir=(0, -1, 0), z_dir=(1, 0, 0))):
        Polygon((0, 0), (0, 0.50043031), (0.5, 0.2), (0.5, 0), align=None)
    f_1_0mm_dowel_hole1 = revolve(axis=Axis((0.85, 3.15, 11.35), (0, 0, -1)), mode=Mode.SUBTRACT)

    # Ø1.0mm Dowel Hole1 at 2: Ø1.0mm Dowel Hole1 ×2
    with Locations(*[(0, -i * F_1_0MM_DOWEL_HOLE1_AT_2_PITCH, 0) for i in range(1, F_1_0MM_DOWEL_HOLE1_AT_2_COUNT)]):
        add(f_1_0mm_dowel_hole1, mode=Mode.SUBTRACT)

    # Sketch28 → UNM0.6 Tapped Hole1 (revolve, cut)
    with BuildSketch(Plane(origin=(0.85, 1, 3.65), x_dir=(0, 0, -1), z_dir=(1, 0, 0))):
        Polygon((0, 0), (0, 2.085193639), (0.225, 1.95), (0.225, 0), align=None)
    unm0_6_tapped_hole1 = revolve(axis=Axis((0.85, -5.35, 3.65), (0, 1, 0)), mode=Mode.SUBTRACT)

    # Mirror1: Ø1.0mm Dowel Hole1, UNM0.6 Tapped Hole1 across plane
    add(f_1_0mm_dowel_hole1.mirror(Plane(origin=(0, 0, 2.5), x_dir=(1, 0, 0), z_dir=(0, 0, -1))), mode=Mode.SUBTRACT)
    add(unm0_6_tapped_hole1.mirror(Plane(origin=(0, 0, 2.5), x_dir=(1, 0, 0), z_dir=(0, 0, -1))), mode=Mode.SUBTRACT)

    # Mirror1 copy 1 sketch → Mirror1 copy 1 (revolve, cut)
    with BuildSketch(Plane(origin=(0.85, 1.85, 0), x_dir=(0, -1, 0), z_dir=(1, 0, 0))):
        Polygon((0, 0), (0, -0.50043031), (0.5, -0.2), (0.5, 0), align=None)
    revolve(axis=Axis((0.85, 1.85, -6.35), (0, 0, -1)), mode=Mode.SUBTRACT)


solid = part.part
